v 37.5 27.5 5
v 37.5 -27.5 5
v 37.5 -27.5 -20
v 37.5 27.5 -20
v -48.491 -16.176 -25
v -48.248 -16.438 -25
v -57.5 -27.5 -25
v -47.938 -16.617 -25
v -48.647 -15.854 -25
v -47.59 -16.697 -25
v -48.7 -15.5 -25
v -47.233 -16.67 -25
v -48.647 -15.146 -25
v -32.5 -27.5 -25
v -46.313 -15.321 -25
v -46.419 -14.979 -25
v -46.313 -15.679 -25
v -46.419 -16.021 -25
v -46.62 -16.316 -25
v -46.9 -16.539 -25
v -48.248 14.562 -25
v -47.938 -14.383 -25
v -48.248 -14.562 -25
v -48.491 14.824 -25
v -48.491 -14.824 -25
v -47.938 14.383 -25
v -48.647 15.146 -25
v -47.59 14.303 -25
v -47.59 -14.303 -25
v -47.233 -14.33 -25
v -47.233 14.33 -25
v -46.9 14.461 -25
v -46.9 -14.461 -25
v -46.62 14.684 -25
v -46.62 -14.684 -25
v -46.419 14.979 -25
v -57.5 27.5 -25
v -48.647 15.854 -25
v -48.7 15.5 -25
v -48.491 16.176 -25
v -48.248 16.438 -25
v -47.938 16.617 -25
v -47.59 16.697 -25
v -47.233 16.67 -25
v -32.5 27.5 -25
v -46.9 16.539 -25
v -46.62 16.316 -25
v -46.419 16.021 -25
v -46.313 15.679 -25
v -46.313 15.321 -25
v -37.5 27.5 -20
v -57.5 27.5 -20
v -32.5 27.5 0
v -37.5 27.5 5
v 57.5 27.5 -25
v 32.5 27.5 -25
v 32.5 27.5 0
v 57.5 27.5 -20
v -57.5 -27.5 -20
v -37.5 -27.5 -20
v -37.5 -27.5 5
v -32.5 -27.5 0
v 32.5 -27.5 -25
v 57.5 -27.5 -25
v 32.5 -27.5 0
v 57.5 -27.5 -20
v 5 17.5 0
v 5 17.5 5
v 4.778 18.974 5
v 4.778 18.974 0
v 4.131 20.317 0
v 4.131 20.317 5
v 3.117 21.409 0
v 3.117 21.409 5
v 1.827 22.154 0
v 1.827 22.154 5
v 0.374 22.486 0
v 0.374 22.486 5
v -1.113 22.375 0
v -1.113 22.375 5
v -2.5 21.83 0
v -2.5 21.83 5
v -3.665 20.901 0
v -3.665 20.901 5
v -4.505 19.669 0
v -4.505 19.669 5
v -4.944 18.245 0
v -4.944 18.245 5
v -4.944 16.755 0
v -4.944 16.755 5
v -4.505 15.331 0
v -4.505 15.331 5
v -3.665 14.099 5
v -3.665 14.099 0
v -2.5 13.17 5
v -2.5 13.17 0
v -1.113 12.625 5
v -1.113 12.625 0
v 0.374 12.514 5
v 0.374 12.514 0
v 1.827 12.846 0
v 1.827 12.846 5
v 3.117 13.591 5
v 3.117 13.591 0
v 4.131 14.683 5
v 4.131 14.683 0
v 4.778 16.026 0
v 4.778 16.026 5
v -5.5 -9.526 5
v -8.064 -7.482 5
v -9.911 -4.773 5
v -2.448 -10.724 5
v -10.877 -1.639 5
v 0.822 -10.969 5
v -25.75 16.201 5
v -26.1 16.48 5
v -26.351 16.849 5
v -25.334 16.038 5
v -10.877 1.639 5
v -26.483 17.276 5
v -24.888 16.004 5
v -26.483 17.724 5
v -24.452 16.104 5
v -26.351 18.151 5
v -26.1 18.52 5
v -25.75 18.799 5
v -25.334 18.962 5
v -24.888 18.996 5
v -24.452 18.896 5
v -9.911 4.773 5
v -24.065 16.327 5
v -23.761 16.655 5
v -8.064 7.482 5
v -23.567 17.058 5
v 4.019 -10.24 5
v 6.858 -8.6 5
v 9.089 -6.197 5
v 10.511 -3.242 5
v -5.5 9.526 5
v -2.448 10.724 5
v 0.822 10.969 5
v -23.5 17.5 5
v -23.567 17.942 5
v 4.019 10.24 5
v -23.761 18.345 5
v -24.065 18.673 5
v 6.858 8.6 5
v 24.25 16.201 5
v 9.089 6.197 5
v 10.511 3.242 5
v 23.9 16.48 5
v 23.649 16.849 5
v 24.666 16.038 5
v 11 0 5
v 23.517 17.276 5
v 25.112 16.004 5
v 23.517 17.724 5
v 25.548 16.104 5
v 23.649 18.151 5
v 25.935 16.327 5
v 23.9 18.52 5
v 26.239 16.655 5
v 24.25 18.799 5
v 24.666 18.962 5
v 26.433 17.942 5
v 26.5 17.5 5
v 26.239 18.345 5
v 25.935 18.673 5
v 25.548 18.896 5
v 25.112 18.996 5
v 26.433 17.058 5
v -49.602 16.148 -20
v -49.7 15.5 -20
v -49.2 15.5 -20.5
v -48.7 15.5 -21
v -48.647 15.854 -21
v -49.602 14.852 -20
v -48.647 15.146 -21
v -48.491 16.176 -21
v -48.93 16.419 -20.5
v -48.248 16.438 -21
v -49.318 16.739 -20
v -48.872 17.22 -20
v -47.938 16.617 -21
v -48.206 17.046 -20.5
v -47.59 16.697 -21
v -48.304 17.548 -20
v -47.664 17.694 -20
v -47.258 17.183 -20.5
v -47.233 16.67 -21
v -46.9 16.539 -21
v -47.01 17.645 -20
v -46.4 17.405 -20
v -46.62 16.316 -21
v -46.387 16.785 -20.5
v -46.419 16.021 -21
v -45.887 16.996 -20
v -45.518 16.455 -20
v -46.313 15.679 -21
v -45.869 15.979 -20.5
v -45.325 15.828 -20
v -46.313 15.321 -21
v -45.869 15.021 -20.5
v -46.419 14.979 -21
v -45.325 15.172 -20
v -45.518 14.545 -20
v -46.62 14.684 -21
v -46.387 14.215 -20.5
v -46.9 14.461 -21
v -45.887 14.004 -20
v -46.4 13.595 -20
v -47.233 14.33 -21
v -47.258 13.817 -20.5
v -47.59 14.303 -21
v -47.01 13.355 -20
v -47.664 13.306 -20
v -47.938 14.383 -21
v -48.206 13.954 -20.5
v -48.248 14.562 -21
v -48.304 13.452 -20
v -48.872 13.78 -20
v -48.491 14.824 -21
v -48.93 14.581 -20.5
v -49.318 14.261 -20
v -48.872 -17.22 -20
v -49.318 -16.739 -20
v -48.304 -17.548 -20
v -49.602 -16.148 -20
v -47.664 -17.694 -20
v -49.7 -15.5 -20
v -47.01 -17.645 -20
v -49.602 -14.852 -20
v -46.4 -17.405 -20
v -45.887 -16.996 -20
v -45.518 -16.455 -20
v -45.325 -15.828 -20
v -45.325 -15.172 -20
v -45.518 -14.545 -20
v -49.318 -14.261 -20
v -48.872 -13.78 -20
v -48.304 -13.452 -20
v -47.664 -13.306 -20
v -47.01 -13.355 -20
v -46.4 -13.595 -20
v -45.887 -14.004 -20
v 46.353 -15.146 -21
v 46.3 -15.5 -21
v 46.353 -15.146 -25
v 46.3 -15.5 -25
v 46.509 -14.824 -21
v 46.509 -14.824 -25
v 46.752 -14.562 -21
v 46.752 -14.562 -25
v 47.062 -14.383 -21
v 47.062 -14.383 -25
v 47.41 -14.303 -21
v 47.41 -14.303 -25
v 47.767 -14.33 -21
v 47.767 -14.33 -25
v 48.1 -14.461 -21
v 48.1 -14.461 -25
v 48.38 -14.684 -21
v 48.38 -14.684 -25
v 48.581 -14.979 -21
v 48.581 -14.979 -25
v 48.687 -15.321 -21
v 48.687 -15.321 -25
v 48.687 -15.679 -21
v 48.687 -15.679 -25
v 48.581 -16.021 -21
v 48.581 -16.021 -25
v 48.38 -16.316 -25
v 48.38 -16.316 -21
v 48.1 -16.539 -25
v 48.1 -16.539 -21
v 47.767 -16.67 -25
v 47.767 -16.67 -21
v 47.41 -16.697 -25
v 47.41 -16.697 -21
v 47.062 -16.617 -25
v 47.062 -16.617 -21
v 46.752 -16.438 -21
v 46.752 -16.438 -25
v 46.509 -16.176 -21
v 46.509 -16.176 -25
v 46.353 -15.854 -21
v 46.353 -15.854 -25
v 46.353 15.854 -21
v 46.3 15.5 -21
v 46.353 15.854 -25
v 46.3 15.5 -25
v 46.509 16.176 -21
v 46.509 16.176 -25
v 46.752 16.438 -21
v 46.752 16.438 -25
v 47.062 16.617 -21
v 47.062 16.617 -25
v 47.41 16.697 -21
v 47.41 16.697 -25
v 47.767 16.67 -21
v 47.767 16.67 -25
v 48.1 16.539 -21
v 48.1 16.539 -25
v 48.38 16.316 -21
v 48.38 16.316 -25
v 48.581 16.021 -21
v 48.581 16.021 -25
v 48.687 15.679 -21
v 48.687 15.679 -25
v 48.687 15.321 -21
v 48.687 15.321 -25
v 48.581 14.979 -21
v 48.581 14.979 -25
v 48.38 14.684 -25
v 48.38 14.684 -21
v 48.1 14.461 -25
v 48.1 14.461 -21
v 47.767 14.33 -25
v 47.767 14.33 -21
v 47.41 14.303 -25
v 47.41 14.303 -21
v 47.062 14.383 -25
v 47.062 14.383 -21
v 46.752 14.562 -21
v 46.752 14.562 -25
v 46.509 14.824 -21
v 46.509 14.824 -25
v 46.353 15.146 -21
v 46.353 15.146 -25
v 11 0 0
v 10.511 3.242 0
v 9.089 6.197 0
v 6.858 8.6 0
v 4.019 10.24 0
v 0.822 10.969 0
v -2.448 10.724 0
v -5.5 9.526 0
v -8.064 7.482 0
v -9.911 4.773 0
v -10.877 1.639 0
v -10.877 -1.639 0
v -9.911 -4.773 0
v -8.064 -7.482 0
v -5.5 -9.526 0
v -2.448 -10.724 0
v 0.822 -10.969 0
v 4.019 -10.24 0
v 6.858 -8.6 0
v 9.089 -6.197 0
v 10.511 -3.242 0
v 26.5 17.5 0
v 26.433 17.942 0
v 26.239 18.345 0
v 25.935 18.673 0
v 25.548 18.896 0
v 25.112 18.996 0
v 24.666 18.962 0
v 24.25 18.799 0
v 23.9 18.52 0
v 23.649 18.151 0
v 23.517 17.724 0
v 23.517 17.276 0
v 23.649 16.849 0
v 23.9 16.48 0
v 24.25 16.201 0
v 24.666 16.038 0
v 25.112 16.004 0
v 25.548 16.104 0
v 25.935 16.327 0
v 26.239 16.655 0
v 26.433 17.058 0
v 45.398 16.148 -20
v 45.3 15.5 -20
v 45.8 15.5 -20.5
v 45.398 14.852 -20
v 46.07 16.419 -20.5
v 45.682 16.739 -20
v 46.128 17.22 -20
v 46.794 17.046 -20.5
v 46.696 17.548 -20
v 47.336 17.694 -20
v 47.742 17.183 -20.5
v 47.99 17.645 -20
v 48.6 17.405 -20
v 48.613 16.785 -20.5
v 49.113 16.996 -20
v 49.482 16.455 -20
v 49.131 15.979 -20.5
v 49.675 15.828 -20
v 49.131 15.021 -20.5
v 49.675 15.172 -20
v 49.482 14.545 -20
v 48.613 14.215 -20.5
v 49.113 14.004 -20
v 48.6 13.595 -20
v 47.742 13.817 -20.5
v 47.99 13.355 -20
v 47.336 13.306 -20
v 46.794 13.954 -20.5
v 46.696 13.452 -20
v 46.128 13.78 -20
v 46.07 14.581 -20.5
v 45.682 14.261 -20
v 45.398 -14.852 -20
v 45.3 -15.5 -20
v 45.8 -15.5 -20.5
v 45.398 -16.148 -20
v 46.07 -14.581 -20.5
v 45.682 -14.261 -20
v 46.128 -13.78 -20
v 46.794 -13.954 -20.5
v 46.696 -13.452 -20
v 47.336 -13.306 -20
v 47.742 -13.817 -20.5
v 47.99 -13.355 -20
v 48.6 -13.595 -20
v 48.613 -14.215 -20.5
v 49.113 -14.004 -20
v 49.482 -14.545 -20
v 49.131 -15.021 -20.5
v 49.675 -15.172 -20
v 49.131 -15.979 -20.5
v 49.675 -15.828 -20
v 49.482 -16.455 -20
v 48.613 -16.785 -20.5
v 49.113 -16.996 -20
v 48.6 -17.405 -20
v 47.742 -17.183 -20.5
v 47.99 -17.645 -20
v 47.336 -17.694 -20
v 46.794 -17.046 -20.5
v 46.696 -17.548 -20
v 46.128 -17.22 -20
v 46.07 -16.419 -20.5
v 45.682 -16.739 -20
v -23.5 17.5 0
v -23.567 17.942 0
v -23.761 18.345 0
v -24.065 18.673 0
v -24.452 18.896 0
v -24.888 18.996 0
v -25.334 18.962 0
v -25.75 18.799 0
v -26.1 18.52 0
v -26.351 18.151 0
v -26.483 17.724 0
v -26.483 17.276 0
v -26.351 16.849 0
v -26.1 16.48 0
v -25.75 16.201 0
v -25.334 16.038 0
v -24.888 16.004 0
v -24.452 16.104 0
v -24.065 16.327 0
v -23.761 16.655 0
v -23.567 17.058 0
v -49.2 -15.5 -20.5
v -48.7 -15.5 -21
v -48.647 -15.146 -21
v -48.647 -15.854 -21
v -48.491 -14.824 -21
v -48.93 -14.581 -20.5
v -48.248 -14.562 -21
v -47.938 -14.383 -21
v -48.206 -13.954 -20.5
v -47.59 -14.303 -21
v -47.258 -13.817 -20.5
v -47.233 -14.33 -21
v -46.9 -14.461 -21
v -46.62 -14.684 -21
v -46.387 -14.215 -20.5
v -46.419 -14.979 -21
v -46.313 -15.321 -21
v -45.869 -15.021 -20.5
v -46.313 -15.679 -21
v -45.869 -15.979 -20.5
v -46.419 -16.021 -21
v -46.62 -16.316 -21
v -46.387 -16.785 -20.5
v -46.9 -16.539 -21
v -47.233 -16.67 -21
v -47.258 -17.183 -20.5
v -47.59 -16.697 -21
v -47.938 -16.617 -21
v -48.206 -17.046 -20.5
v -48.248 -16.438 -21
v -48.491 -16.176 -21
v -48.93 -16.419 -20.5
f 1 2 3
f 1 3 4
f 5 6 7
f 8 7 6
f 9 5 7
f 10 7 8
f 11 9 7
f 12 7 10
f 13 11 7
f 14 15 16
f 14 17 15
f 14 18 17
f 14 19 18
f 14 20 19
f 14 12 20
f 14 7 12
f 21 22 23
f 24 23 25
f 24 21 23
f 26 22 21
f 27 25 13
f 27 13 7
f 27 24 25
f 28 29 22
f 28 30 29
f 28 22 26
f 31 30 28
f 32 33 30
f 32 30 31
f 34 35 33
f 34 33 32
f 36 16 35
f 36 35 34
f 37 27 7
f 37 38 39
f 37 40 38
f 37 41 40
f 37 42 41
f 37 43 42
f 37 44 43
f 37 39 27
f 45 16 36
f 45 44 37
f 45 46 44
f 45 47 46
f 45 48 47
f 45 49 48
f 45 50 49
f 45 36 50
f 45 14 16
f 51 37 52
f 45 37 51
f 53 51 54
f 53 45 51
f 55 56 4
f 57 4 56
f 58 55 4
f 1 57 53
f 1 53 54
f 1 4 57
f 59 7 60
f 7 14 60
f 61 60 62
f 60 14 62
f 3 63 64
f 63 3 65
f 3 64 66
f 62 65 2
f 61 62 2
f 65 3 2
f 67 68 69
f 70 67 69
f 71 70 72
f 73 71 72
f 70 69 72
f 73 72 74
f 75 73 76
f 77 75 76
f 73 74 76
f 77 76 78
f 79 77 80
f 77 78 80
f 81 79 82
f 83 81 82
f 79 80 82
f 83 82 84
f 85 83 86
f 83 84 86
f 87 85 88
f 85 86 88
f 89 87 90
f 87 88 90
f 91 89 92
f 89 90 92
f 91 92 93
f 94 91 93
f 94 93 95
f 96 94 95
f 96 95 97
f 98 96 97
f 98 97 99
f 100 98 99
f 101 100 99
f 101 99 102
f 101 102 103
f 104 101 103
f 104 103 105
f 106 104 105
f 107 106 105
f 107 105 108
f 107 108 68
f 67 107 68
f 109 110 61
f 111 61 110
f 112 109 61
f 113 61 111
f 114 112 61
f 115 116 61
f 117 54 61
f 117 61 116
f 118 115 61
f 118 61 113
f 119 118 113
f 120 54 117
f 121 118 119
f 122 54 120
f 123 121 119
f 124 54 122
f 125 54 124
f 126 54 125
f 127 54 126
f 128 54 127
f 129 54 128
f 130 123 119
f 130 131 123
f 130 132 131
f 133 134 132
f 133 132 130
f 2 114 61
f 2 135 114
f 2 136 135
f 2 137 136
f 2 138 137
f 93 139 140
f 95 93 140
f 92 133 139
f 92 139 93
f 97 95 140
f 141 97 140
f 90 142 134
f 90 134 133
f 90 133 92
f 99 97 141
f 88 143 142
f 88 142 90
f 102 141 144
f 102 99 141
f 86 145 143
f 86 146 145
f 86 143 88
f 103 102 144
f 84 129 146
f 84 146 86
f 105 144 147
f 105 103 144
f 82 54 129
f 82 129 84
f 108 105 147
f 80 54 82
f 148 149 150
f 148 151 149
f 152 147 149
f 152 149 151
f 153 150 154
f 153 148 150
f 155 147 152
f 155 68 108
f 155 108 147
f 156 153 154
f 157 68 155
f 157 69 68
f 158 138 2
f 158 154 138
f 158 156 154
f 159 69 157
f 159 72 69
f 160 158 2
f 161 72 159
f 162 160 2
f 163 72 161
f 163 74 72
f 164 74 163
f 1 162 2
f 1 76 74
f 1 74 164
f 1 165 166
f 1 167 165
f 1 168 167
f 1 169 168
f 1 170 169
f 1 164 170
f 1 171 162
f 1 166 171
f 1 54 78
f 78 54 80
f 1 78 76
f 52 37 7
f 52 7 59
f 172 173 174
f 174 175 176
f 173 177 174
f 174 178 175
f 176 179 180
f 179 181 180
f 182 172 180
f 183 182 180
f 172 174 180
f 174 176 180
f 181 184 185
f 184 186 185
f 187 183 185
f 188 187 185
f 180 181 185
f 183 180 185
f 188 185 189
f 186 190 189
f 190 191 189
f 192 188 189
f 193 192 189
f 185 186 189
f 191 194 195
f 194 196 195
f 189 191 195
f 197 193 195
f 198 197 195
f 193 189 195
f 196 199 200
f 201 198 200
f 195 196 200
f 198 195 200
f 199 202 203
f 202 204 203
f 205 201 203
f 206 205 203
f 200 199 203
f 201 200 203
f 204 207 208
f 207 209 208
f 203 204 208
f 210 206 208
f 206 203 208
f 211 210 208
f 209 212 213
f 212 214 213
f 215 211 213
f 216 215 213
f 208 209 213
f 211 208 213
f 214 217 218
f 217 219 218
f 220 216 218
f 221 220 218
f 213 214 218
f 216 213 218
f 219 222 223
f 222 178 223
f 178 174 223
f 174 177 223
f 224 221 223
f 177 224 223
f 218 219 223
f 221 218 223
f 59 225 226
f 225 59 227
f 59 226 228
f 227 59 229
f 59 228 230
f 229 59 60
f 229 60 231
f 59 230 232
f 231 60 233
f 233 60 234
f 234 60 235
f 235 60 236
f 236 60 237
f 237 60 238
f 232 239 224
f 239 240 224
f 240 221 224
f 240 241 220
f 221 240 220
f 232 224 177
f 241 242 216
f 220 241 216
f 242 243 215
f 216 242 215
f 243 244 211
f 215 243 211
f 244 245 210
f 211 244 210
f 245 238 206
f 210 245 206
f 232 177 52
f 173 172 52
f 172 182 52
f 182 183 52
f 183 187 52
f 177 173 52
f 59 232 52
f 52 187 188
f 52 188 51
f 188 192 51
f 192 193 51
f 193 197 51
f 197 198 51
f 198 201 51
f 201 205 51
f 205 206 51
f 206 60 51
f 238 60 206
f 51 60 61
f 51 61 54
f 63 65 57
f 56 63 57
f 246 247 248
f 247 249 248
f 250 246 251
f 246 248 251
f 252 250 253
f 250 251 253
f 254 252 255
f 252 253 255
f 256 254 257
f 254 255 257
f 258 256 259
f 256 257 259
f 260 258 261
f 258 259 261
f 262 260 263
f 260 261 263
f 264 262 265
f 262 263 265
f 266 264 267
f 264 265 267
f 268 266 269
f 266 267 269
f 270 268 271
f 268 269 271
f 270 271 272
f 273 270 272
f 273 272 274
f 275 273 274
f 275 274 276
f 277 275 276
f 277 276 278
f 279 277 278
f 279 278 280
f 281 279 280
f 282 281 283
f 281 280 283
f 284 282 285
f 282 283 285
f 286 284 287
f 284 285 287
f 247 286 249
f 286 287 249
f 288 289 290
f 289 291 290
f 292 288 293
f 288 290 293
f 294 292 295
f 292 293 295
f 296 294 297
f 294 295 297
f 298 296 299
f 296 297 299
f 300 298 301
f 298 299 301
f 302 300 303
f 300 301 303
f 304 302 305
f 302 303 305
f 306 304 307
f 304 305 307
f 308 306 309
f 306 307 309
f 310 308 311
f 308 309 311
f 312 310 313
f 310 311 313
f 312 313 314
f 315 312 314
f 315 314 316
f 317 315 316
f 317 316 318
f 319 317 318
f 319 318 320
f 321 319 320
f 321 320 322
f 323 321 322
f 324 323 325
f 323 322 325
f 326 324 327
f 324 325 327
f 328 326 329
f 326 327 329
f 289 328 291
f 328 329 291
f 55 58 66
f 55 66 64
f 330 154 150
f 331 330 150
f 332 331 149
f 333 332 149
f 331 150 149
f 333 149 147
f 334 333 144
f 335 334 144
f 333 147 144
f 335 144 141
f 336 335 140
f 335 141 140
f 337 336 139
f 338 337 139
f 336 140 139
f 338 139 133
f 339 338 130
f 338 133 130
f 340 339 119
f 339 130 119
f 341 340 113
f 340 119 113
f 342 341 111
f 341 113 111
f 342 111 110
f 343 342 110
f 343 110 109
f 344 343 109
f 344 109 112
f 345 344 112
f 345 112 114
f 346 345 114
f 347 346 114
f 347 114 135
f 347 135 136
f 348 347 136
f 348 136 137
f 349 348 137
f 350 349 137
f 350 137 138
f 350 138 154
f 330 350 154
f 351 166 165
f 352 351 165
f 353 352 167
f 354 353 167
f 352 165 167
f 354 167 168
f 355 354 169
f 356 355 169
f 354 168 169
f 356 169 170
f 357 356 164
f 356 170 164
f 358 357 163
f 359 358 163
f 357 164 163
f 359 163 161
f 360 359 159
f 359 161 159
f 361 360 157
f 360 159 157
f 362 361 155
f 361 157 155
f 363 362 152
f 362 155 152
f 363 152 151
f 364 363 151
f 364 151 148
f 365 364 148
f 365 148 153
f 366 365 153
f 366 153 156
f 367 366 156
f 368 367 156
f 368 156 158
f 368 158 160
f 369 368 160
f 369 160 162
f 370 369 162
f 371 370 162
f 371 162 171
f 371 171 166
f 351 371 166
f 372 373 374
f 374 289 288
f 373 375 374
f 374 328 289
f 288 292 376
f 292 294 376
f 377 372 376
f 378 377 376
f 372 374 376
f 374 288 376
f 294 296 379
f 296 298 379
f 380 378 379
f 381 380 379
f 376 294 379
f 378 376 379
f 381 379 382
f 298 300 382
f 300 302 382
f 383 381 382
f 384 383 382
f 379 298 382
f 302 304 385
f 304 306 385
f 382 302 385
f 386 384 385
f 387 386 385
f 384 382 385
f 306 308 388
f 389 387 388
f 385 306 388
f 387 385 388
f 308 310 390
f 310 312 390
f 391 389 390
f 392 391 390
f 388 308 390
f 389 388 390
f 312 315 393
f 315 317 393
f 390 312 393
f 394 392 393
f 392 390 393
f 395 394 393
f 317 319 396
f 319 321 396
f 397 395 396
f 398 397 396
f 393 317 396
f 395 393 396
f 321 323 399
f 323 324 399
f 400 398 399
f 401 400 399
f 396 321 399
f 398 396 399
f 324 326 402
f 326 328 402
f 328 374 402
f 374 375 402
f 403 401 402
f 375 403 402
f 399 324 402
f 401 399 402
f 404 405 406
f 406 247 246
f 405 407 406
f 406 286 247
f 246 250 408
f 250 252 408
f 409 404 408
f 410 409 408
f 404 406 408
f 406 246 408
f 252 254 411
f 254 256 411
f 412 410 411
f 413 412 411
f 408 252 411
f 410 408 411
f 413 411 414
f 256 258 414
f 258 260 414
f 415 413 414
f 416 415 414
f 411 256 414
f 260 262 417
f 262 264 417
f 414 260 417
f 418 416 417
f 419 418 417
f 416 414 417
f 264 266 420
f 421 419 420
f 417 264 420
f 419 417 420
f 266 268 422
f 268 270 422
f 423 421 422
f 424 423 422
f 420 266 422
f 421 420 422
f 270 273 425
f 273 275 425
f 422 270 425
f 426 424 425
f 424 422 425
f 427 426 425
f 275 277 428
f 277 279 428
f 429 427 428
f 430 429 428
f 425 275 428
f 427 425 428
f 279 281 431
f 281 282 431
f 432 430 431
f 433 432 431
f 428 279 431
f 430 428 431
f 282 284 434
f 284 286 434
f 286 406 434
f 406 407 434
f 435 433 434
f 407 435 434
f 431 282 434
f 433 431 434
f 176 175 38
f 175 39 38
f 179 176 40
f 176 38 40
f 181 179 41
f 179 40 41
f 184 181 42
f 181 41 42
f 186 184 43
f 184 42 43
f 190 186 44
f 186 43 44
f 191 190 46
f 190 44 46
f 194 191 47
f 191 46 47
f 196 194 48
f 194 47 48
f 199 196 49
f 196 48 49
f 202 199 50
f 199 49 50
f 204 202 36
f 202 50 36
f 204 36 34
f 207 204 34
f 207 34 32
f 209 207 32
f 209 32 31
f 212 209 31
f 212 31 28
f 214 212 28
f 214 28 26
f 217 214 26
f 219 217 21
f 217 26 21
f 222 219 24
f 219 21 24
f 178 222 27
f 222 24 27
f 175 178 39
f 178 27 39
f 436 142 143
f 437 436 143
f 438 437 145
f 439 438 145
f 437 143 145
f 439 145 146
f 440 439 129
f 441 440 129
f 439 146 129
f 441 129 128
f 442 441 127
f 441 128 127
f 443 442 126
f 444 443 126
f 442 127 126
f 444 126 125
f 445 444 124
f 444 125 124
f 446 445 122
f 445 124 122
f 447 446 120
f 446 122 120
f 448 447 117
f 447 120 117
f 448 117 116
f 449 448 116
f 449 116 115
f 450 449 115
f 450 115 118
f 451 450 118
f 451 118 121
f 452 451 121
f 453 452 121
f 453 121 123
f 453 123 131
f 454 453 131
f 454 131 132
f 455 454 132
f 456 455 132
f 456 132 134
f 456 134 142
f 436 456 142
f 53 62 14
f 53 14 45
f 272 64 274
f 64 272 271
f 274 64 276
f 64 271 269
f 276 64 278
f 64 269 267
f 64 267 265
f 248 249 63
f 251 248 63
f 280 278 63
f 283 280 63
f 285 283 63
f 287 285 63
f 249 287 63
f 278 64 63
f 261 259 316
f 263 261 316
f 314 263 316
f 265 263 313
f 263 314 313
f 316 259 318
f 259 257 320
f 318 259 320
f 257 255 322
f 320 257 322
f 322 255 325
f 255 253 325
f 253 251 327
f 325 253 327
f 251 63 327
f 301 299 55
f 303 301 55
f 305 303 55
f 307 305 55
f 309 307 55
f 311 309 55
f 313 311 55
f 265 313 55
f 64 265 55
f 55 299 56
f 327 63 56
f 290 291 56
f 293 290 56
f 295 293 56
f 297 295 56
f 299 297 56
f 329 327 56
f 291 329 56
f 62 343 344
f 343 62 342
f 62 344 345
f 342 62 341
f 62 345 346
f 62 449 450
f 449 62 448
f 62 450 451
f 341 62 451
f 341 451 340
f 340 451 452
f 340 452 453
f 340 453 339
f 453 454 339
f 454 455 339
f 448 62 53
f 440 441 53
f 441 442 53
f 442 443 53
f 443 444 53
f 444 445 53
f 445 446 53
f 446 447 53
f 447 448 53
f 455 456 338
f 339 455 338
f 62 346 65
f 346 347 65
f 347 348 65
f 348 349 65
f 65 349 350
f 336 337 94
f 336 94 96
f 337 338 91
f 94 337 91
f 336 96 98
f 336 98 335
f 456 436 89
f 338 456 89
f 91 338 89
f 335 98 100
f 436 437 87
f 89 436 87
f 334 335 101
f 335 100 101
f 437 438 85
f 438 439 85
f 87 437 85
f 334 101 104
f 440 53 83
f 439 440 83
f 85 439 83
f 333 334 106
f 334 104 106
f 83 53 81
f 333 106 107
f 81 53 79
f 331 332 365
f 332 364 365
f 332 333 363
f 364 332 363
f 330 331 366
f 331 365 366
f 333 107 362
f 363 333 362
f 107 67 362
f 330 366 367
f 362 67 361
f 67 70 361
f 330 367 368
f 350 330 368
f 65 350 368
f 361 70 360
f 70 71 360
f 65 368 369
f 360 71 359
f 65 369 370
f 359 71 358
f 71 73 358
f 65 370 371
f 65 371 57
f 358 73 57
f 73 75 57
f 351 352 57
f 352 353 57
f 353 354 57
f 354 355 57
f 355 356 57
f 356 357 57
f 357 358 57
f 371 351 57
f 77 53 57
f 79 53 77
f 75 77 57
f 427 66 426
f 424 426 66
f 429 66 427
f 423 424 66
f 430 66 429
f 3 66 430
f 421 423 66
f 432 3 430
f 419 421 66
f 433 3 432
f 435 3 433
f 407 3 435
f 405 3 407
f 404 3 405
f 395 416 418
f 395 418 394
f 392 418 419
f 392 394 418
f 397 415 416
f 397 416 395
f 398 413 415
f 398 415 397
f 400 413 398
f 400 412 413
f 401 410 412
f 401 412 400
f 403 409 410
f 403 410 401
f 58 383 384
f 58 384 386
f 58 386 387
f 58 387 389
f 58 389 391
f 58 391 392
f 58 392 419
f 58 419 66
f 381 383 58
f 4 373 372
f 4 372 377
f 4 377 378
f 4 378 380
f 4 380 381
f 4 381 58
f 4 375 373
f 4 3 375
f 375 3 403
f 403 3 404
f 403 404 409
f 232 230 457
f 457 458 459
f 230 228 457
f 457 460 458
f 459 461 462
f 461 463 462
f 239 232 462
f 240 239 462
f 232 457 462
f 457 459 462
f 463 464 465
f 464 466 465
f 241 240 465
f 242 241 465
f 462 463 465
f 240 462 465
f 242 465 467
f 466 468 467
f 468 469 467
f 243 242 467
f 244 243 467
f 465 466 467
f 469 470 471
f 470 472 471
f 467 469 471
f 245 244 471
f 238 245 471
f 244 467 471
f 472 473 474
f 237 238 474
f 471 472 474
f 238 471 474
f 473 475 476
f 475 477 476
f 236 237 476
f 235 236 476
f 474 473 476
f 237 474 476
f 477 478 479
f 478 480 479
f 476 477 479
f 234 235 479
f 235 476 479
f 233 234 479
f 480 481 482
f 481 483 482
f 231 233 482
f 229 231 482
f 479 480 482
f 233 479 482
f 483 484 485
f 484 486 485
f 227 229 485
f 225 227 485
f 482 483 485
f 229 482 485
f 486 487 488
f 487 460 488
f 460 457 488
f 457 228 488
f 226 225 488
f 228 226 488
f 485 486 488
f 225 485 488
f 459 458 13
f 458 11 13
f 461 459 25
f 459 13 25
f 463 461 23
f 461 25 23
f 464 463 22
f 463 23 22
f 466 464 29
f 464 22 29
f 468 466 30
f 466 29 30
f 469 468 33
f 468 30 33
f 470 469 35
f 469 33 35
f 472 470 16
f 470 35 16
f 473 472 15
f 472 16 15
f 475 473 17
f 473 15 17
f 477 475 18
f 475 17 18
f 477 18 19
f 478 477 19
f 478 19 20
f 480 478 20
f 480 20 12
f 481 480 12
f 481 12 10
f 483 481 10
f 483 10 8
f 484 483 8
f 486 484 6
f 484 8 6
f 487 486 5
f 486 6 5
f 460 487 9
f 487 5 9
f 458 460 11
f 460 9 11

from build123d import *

# Parameters (mm, degrees)
SKETCH1_W                                      = 75
SKETCH1_H                                      = 55
BOSS_EXTRUDE1_DEPTH                            = 5
SKETCH2_W                                      = 5
SKETCH2_H                                      = 55
BOSS_EXTRUDE2_DEPTH                            = 25
CUT_EXTRUDE1_REACH                             = 32
SKETCH3_R                                      = 5
SKETCH3_R_2                                    = 1.5
SKETCH3_R_3                                    = 11
SKETCH4_W                                      = 5
SKETCH4_H                                      = 55
BOSS_EXTRUDE3_DEPTH                            = 20
SKETCH5_W                                      = 5
SKETCH5_H                                      = 55
BOSS_EXTRUDE4_DEPTH                            = 20
M2_D_Z_BA_L_MAKINE_VIDAS_IN_HAV_A1_D           = 2.4
M2_D_Z_BA_L_MAKINE_VIDAS_IN_HAV_A1_CSINK_D     = 4.4
M2_D_Z_BA_L_MAKINE_VIDAS_IN_HAV_A1_CSINK_ANGLE = 90


with BuildPart() as part:
    # Sketch1 → Boss-Extrude1 (new body)
    with BuildSketch(Plane.XY):
        Rectangle(SKETCH1_W, SKETCH1_H)
    extrude(amount=BOSS_EXTRUDE1_DEPTH)

    # Sketch2 → Boss-Extrude2 (add)
    with BuildSketch(Plane(origin=(0, 0, 0), x_dir=(-1, 0, 0), z_dir=(0, 0, -1))):
        with Locations((-35, 0)):
            Rectangle(SKETCH2_W, SKETCH2_H)
        with Locations((35, 0)):
            Rectangle(SKETCH2_W, SKETCH2_H)
    extrude(amount=BOSS_EXTRUDE2_DEPTH)

    # Sketch3 → Cut-Extrude1 (cut, up to next)
    with BuildSketch(Plane.XY.offset(5), mode=Mode.PRIVATE) as cut_extrude1_sk1:
        with Locations((0, 17.5)):
            Circle(SKETCH3_R)
    cut_extrude1_tool1 = extrude(cut_extrude1_sk1.sketch, amount=-CUT_EXTRUDE1_REACH, mode=Mode.PRIVATE) & part.part
    add(cut_extrude1_tool1.solids().sort_by_distance((0, 17.5, 5))[0], mode=Mode.SUBTRACT)
    # Sketch3 → Cut-Extrude1 (cut, up to next)
    with BuildSketch(Plane.XY.offset(5), mode=Mode.PRIVATE) as cut_extrude1_sk2:
        with Locations((-25, 17.5)):
            Circle(SKETCH3_R_2)
    cut_extrude1_tool2 = extrude(cut_extrude1_sk2.sketch, amount=-CUT_EXTRUDE1_REACH, mode=Mode.PRIVATE) & part.part
    add(cut_extrude1_tool2.solids().sort_by_distance((-25, 17.5, 5))[0], mode=Mode.SUBTRACT)
    # Sketch3 → Cut-Extrude1 (cut, up to next)
    with BuildSketch(Plane.XY.offset(5), mode=Mode.PRIVATE) as cut_extrude1_sk3:
        with Locations((25, 17.5)):
            Circle(SKETCH3_R_2)
    cut_extrude1_tool3 = extrude(cut_extrude1_sk3.sketch, amount=-CUT_EXTRUDE1_REACH, mode=Mode.PRIVATE) & part.part
    add(cut_extrude1_tool3.solids().sort_by_distance((25, 17.5, 5))[0], mode=Mode.SUBTRACT)
    # Sketch3 → Cut-Extrude1 (cut, up to next)
    with BuildSketch(Plane.XY.offset(5), mode=Mode.PRIVATE) as cut_extrude1_sk4:
        Circle(SKETCH3_R_3)
    cut_extrude1_tool4 = extrude(cut_extrude1_sk4.sketch, amount=-CUT_EXTRUDE1_REACH, mode=Mode.PRIVATE) & part.part
    add(cut_extrude1_tool4.solids().sort_by_distance((0, 0, 5))[0], mode=Mode.SUBTRACT)

    # Sketch4 → Boss-Extrude3 (add)
    with BuildSketch(Plane(origin=(37.5, 0, 0), x_dir=(0, 0, -1), z_dir=(1, 0, 0))):
        with Locations((22.5, 0)):
            Rectangle(SKETCH4_W, SKETCH4_H)
    extrude(amount=BOSS_EXTRUDE3_DEPTH)

    # Sketch5 → Boss-Extrude4 (add)
    with BuildSketch(Plane.ZY.offset(37.5)):
        with Locations((-22.5, 0)):
            Rectangle(SKETCH5_W, SKETCH5_H)
    extrude(amount=BOSS_EXTRUDE4_DEPTH)

    # M2 Düz Başlı Makine Vidası İçin Havşa1 (through all)
    with Locations(Plane.XY.offset(-20)):
        with Locations((-47.5, 15.5), (-47.5, -15.5), (47.5, 15.5), (47.5, -15.5)):
            CounterSinkHole(M2_D_Z_BA_L_MAKINE_VIDAS_IN_HAV_A1_D / 2, M2_D_Z_BA_L_MAKINE_VIDAS_IN_HAV_A1_CSINK_D / 2, counter_sink_angle=M2_D_Z_BA_L_MAKINE_VIDAS_IN_HAV_A1_CSINK_ANGLE)


solid = part.part
